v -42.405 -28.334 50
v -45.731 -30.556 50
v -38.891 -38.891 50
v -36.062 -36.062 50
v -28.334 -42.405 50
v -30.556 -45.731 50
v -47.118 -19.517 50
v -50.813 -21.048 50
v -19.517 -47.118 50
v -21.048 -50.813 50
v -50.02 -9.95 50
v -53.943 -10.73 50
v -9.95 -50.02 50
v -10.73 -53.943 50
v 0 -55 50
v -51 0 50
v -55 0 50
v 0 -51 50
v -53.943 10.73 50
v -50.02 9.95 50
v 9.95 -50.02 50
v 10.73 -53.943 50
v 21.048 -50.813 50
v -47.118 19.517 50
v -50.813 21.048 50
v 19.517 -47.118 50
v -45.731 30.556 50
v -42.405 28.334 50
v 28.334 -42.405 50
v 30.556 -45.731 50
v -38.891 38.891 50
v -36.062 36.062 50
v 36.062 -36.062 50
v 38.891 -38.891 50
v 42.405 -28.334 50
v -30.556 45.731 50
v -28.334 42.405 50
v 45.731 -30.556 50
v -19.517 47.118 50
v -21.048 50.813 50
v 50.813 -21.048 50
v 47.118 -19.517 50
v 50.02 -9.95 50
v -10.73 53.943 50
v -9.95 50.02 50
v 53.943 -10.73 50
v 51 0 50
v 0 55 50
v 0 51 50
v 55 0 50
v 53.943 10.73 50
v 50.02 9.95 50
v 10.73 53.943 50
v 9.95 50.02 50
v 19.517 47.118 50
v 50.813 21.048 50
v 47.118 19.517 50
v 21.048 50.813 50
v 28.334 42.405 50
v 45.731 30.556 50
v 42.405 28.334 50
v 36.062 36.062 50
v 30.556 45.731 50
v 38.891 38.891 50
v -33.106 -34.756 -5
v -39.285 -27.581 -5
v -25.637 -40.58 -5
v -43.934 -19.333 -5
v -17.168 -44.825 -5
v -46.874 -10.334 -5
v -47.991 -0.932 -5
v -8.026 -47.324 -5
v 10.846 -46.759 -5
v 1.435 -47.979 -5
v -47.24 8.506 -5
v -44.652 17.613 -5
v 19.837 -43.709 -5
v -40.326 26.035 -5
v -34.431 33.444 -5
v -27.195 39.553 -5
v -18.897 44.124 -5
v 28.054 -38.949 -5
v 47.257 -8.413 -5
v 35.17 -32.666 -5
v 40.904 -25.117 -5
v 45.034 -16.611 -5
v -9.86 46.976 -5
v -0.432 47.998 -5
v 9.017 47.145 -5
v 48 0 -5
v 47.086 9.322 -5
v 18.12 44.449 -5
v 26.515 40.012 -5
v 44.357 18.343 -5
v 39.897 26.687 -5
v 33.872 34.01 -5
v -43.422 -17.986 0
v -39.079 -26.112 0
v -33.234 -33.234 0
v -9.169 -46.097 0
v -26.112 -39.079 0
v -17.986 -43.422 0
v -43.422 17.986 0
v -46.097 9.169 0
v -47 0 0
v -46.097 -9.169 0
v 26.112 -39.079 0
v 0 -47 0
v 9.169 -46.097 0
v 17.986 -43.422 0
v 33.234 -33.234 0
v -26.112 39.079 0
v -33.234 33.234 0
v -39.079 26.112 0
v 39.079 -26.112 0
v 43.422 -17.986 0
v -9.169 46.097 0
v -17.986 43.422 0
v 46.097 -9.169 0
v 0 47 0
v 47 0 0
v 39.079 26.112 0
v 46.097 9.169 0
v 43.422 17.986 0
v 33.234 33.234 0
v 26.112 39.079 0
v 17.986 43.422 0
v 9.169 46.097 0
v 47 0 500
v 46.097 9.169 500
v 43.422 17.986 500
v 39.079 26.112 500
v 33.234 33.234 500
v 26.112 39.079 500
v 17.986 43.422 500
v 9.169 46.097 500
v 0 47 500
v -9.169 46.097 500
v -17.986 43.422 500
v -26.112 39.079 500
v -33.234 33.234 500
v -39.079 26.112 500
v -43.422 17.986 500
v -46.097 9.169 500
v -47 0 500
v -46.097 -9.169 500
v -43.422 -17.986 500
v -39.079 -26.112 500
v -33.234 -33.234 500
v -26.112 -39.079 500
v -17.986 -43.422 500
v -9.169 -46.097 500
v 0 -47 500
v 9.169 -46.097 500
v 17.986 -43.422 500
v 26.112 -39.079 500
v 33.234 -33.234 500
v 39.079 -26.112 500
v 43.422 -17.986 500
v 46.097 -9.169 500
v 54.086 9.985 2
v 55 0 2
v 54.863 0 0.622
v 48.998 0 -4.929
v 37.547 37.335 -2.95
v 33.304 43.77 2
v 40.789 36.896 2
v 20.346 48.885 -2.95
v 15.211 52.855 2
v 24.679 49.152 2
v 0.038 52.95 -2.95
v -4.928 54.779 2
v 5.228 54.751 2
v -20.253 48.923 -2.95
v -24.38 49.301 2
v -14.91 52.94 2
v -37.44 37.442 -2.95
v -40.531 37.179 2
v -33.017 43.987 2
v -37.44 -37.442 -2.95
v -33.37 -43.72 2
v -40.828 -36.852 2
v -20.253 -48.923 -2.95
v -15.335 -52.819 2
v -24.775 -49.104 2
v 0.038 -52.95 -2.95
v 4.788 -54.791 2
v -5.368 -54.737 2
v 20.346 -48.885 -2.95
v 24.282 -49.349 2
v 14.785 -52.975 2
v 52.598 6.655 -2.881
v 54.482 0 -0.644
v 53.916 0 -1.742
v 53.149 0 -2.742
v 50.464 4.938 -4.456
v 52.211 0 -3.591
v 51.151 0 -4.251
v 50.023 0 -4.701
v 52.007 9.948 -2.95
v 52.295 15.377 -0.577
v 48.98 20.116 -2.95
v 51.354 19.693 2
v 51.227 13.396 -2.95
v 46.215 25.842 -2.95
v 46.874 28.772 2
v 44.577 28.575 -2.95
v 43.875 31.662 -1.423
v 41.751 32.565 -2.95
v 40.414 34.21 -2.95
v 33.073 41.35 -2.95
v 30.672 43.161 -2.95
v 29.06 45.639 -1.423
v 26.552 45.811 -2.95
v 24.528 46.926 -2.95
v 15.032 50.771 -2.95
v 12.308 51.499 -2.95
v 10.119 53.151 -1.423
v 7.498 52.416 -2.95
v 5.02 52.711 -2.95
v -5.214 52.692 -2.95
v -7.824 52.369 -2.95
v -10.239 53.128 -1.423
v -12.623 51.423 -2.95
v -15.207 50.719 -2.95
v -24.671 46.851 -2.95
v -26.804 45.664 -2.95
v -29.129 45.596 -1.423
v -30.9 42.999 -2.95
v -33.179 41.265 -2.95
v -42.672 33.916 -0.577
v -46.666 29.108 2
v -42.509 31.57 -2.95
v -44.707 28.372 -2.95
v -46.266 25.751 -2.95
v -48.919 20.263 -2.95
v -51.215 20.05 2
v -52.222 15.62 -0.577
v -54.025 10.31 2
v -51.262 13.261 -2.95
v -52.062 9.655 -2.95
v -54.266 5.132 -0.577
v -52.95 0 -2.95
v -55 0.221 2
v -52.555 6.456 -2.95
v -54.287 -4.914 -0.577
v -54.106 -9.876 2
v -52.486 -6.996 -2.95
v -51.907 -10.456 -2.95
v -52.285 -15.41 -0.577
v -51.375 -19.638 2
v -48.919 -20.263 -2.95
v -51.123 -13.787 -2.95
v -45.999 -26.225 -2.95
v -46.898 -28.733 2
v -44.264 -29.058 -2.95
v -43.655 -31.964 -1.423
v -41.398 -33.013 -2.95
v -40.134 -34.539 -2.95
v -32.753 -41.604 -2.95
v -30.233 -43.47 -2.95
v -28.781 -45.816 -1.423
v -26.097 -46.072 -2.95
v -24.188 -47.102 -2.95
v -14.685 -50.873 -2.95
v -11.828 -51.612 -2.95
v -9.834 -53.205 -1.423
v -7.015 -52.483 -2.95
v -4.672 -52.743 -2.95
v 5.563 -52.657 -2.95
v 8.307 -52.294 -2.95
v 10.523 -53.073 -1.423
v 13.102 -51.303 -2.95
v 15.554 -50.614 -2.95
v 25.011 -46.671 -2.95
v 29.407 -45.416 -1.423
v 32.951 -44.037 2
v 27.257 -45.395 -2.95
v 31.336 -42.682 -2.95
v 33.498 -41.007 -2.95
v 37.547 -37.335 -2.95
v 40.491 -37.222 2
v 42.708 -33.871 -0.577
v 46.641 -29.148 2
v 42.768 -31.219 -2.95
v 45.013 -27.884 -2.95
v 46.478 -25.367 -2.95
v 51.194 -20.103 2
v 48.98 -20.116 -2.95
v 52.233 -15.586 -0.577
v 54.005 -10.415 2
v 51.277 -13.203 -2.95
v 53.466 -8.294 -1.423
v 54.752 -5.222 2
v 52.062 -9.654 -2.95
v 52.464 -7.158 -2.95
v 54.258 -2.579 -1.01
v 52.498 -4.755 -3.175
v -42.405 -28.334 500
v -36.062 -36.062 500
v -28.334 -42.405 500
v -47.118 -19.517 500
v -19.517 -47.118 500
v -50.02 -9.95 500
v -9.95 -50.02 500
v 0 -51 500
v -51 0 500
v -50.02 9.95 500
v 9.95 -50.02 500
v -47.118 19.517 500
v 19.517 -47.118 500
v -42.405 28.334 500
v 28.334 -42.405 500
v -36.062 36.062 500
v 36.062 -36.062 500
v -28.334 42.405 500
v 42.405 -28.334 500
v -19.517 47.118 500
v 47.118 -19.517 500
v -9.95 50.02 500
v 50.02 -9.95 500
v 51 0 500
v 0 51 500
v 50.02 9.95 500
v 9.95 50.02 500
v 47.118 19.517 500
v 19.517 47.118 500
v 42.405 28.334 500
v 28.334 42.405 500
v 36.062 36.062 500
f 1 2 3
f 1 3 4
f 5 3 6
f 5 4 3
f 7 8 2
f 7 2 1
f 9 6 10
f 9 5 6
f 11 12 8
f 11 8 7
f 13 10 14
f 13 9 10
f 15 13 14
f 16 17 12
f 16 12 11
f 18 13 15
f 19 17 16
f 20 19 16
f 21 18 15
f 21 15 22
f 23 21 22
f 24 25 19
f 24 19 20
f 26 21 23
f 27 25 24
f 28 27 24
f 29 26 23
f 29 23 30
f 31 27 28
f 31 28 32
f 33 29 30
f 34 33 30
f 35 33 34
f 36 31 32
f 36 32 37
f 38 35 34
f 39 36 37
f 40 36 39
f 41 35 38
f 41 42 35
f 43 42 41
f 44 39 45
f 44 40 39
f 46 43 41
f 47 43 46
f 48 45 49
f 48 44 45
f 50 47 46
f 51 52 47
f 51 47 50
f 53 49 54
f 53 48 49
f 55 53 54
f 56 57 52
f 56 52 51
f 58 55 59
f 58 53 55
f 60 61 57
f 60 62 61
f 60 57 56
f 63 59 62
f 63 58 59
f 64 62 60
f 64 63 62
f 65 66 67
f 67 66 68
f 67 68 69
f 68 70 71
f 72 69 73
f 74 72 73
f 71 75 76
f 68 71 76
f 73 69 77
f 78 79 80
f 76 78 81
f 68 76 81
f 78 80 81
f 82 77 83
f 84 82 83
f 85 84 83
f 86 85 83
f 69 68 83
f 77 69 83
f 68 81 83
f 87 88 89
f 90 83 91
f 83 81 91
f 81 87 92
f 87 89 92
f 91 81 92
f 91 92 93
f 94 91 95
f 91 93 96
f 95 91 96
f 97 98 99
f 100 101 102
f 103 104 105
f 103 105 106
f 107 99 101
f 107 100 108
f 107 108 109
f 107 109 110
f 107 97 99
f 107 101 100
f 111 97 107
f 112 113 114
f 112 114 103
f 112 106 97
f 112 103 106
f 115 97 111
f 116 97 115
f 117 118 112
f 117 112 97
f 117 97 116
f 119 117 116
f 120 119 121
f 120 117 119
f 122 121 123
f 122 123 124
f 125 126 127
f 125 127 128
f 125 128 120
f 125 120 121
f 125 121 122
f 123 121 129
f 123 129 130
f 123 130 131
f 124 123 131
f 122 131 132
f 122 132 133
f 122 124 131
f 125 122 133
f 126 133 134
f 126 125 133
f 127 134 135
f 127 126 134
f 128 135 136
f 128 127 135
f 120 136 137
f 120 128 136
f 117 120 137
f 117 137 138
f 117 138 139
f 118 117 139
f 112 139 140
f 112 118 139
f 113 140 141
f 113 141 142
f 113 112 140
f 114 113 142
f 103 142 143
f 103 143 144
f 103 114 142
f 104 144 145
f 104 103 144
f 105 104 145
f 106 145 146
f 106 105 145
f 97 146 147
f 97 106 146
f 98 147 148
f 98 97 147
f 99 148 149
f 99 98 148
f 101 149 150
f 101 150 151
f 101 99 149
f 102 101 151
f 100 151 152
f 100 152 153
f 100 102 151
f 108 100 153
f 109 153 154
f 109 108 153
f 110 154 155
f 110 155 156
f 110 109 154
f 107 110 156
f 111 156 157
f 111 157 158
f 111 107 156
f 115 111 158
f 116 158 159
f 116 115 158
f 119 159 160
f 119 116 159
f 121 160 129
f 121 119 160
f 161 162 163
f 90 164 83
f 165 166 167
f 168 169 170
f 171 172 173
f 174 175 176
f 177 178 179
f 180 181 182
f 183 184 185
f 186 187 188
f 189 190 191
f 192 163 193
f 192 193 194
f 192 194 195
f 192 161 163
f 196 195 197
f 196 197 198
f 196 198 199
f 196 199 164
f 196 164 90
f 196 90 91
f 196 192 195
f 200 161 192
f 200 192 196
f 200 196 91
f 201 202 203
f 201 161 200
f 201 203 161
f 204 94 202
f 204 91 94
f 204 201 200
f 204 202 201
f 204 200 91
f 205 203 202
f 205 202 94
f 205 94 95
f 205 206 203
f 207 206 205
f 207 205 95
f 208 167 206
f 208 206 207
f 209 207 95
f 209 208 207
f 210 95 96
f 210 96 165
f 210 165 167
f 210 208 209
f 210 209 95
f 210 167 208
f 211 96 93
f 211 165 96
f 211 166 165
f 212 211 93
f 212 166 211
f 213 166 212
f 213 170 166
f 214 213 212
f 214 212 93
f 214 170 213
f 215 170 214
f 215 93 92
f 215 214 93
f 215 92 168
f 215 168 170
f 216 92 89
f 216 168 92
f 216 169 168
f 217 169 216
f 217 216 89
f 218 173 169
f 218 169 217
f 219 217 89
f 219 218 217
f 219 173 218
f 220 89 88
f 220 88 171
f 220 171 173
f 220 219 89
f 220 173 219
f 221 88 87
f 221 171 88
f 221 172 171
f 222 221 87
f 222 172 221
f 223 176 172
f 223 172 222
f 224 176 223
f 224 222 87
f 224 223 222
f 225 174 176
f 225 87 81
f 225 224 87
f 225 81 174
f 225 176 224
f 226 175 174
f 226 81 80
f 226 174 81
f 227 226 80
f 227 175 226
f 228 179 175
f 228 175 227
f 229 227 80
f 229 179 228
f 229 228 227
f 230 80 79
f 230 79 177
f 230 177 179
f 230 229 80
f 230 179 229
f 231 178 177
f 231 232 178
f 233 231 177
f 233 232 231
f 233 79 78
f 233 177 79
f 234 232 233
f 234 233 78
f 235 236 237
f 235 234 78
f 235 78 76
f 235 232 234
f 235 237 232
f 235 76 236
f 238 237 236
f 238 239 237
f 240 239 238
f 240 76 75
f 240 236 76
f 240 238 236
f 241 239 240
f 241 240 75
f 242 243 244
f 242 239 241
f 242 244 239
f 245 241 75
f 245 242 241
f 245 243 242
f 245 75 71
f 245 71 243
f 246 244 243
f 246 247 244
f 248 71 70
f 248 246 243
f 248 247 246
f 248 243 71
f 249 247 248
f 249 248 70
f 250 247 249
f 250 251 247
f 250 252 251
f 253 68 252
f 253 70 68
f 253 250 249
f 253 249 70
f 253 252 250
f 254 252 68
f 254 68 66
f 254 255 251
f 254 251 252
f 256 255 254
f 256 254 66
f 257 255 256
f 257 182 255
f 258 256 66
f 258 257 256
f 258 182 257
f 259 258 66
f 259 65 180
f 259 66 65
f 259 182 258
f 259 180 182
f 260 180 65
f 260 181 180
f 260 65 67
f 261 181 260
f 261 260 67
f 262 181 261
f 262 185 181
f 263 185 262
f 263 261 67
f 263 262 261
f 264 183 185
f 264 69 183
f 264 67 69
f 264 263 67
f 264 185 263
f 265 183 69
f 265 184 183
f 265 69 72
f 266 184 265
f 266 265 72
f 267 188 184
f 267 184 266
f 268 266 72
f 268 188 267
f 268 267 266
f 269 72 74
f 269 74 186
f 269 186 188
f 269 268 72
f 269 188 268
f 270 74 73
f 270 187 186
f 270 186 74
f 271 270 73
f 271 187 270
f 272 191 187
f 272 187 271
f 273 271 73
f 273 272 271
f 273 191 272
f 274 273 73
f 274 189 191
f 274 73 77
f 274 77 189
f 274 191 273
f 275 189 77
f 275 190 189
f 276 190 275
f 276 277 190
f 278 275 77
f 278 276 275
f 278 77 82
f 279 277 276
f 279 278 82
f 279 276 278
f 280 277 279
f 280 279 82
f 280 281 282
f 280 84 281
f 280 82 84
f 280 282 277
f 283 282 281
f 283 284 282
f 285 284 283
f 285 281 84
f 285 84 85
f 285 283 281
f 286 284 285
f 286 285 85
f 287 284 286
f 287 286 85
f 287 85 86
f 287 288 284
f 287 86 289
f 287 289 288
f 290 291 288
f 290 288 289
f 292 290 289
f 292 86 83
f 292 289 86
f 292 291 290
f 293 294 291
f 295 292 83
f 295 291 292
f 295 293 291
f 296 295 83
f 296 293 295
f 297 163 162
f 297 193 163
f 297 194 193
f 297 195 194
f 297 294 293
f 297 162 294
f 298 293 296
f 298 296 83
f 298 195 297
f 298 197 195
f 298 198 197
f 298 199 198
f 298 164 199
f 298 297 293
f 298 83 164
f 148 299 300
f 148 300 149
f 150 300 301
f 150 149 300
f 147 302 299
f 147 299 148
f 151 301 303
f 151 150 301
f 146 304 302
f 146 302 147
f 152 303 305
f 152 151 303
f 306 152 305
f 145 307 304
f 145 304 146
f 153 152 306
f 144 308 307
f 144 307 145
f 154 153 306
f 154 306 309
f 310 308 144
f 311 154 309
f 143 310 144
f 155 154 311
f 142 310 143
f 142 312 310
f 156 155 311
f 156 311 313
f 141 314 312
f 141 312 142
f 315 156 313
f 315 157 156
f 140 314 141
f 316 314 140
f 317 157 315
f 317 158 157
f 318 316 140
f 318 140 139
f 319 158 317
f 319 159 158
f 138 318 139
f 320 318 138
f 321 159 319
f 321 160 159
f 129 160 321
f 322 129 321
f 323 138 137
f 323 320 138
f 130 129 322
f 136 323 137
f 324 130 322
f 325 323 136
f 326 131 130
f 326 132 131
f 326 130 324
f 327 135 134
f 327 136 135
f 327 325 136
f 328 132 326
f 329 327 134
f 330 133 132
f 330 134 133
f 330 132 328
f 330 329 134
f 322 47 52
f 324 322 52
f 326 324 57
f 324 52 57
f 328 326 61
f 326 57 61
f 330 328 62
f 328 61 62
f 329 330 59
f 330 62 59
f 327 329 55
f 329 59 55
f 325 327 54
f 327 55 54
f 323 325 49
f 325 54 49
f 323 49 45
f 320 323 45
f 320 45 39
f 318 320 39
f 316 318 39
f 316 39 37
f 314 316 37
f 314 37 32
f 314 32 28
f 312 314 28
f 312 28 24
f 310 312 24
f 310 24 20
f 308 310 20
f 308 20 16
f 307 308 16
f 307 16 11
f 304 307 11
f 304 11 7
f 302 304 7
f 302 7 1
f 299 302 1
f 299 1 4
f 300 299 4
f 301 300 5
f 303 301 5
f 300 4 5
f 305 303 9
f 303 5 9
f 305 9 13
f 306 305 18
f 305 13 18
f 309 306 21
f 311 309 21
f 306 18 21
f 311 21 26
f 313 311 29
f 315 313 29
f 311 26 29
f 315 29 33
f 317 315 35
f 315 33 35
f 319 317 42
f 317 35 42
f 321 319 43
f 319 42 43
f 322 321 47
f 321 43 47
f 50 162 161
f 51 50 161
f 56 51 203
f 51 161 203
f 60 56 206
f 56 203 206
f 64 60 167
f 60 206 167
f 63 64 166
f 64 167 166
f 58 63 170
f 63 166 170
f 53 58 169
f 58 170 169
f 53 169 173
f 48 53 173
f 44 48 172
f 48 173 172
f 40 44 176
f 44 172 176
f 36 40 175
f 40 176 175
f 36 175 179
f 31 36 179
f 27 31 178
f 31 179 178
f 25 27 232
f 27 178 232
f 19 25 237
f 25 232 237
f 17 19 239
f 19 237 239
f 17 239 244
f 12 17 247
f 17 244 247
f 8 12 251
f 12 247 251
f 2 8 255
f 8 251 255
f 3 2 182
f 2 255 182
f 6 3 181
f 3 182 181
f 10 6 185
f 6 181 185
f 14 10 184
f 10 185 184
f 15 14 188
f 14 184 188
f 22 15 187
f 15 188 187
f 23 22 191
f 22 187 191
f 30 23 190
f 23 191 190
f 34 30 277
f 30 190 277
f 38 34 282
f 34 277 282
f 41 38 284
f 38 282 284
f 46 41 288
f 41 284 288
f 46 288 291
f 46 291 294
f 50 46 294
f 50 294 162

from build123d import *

# Parameters (mm, degrees)
F0_R     = 55
F0_R_2   = 51
F0_R_3   = 47
F1_DEPTH = 5
F2_DEPTH = 500
F3_DEPTH = 50
F4_R     = 7


with BuildPart() as f1:
    # F0 (on Top) → F1 (new body)
    with BuildSketch(Plane.XY):
        Circle(F0_R)
        Circle(F0_R_2, mode=Mode.SUBTRACT)
        Circle(F0_R_2)
        Circle(F0_R_3, mode=Mode.SUBTRACT)
        Circle(F0_R_3)
    extrude(amount=-F1_DEPTH)

    # F0 (on Top) → F2 (join)
    with BuildSketch(Plane.XY):
        Circle(F0_R_2)
        Circle(F0_R_3, mode=Mode.SUBTRACT)
    extrude(amount=F2_DEPTH)

    # F0 (on Top) → F3 (join)
    with BuildSketch(Plane.XY):
        Circle(F0_R)
        Circle(F0_R_2, mode=Mode.SUBTRACT)
    extrude(amount=F3_DEPTH)

    # F4
    f4_edges = [f1.edges().sort_by_distance(p)[0] for p in [
        (-55, 0, -5),
    ]]
    fillet(f4_edges, radius=F4_R)


solid = f1.part
